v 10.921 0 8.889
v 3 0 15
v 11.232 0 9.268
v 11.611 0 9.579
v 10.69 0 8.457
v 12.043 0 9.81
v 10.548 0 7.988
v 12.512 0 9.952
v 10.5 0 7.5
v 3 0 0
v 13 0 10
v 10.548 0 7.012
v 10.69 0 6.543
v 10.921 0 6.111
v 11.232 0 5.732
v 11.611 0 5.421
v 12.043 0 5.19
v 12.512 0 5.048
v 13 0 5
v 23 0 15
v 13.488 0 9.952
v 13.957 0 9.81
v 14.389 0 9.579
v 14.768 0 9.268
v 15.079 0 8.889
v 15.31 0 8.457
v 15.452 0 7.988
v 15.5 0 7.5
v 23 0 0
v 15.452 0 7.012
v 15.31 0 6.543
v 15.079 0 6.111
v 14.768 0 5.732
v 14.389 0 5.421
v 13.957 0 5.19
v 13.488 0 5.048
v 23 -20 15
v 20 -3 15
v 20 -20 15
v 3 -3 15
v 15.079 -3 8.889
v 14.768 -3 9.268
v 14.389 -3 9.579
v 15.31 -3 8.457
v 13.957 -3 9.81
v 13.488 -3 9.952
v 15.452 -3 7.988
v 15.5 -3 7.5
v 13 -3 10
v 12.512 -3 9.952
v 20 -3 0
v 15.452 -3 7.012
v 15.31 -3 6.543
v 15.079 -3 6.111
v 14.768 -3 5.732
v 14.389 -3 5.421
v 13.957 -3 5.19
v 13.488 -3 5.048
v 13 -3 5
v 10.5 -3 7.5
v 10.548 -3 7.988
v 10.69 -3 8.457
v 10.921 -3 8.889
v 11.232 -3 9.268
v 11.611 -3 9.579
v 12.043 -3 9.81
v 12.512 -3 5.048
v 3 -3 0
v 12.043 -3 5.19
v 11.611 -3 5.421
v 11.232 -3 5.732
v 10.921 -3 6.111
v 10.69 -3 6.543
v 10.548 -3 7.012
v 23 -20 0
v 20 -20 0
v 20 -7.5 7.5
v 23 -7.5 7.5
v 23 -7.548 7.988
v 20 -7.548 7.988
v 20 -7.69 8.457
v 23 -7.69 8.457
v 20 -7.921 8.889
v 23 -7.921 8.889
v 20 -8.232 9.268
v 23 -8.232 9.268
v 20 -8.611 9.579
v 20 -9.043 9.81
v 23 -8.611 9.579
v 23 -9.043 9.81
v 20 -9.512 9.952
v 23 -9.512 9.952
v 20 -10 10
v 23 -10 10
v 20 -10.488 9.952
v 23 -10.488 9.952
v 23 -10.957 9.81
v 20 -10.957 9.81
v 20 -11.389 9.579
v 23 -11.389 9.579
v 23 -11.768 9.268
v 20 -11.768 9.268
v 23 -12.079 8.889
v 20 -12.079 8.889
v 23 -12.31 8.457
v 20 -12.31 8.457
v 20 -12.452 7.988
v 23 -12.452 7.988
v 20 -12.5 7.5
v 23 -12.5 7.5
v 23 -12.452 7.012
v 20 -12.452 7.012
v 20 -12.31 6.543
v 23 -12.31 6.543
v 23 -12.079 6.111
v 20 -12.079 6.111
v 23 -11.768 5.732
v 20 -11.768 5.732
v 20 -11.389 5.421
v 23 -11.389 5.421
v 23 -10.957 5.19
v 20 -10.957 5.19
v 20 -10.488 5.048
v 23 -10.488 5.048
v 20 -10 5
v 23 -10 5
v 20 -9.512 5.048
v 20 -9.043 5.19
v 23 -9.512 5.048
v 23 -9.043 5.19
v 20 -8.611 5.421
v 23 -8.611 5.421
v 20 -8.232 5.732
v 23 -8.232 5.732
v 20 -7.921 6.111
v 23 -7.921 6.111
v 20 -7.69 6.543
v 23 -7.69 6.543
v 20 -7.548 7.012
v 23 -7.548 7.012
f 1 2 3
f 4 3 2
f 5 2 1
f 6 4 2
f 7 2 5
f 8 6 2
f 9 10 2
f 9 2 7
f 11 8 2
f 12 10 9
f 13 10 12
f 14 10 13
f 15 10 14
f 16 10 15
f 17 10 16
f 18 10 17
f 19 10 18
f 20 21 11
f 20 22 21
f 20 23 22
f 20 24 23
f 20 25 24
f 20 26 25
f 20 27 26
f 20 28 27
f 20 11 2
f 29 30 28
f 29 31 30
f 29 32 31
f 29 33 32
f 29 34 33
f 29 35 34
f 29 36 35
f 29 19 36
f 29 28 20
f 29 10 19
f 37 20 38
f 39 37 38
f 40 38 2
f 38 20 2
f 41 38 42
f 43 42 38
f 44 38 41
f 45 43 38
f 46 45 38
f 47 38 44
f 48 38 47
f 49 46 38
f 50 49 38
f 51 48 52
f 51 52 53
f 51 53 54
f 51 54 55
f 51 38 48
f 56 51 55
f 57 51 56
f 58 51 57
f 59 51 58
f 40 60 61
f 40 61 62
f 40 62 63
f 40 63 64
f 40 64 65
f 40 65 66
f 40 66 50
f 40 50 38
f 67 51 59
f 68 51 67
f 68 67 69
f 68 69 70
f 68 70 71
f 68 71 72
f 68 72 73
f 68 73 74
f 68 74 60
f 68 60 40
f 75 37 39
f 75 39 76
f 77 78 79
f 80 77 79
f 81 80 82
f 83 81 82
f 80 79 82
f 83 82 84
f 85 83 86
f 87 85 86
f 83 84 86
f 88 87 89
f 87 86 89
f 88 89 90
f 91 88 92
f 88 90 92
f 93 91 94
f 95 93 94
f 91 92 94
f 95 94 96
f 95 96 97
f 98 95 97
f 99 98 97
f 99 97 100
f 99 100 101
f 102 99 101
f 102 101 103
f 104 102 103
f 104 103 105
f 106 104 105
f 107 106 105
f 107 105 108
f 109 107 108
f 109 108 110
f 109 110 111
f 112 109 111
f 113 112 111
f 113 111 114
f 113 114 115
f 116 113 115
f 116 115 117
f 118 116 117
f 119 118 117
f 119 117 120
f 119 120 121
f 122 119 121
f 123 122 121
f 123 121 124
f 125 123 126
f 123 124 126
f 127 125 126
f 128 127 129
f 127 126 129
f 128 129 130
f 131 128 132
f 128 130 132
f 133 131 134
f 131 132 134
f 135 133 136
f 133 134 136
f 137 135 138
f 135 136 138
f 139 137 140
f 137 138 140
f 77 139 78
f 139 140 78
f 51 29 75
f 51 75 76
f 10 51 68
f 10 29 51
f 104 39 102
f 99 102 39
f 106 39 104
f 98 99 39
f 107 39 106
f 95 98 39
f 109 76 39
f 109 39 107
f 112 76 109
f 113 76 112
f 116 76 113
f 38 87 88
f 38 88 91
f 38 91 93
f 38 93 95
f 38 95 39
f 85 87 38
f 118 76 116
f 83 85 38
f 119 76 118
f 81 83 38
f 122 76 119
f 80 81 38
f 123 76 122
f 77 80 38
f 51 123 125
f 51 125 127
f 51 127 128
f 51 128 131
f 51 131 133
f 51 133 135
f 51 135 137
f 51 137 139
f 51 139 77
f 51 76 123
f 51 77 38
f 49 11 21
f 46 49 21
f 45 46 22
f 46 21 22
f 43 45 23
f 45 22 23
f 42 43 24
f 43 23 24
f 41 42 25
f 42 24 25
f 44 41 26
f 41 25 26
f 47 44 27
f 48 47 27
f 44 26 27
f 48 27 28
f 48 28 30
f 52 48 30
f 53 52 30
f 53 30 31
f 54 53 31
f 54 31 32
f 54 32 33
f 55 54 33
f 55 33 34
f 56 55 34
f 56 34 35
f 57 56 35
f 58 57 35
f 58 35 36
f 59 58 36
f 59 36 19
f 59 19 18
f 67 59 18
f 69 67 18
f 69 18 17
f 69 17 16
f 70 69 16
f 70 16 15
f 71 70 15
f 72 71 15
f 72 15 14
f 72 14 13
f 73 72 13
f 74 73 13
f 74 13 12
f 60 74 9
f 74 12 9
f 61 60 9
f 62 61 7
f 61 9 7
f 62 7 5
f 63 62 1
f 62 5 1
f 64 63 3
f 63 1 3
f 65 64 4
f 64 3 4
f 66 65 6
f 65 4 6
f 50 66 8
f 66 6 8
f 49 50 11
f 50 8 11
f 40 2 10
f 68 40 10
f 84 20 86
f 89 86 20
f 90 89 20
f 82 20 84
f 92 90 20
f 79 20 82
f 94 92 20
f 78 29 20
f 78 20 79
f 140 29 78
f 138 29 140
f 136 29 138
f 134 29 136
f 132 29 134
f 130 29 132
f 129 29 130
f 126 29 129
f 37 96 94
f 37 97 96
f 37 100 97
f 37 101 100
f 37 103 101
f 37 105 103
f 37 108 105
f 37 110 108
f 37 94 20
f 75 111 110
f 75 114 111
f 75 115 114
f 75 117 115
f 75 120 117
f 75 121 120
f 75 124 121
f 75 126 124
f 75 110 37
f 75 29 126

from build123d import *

# Parameters (mm, degrees)
EXTRUDE_1_DEPTH     = 15
SKETCH_2_R          = 2.5
CUT_EXTRUDE_1_DEPTH = 15
SKETCH_3_R          = 2.5
CUT_EXTRUDE_2_DEPTH = 15
SKETCH_4_W          = 22.93908914
SKETCH_4_H          = 7.177811465
CUT_EXTRUDE_3_DEPTH = 15
SKETCH_5_W          = 3.489667051
SKETCH_5_H          = 17.448335256
CUT_EXTRUDE_4_DEPTH = 15


with BuildPart() as part:
    # 스케치1 → 보스-돌출1 (new body)
    with BuildSketch(Plane.XY):
        Polygon((0, 0), (23, 0), (23, -23), (20, -23), (20, -3), (0, -3), align=None)
    extrude(amount=EXTRUDE_1_DEPTH)

    # 스케치2 → 컷-돌출1 (cut)
    with BuildSketch(Plane(origin=(0, 0, 0), x_dir=(1, 0, 0), z_dir=(0, 1, 0))):
        with Locations(Location((13, -7.5, 0), (0, 0, 270))):
            Circle(SKETCH_2_R)
    extrude(amount=-CUT_EXTRUDE_1_DEPTH, mode=Mode.SUBTRACT)

    # 스케치3 → 컷-돌출2 (cut)
    with BuildSketch(Plane(origin=(23, 0, 0), x_dir=(0, 0, -1), z_dir=(1, 0, 0))):
        with Locations(Location((-7.5, -10, 0), (0, 0, 90))):
            Circle(SKETCH_3_R)
    extrude(amount=-CUT_EXTRUDE_2_DEPTH, mode=Mode.SUBTRACT)

    # 스케치4 → 컷-돌출3 (cut)
    with BuildSketch(Plane(origin=(23, 0, 0), x_dir=(0, 0, -1), z_dir=(1, 0, 0))):
        with Locations((-7.664491513, -23.588905733)):
            Rectangle(SKETCH_4_W, SKETCH_4_H)
    extrude(amount=-CUT_EXTRUDE_3_DEPTH, mode=Mode.SUBTRACT)

    # 스케치5 → 컷-돌출4 (cut)
    with BuildSketch(Plane(origin=(0, 0, 0), x_dir=(1, 0, 0), z_dir=(0, 1, 0))):
        with Locations((1.255166474, -7.361337733)):
            Rectangle(SKETCH_5_W, SKETCH_5_H)
    extrude(amount=-CUT_EXTRUDE_4_DEPTH, mode=Mode.SUBTRACT)


solid = part.part
